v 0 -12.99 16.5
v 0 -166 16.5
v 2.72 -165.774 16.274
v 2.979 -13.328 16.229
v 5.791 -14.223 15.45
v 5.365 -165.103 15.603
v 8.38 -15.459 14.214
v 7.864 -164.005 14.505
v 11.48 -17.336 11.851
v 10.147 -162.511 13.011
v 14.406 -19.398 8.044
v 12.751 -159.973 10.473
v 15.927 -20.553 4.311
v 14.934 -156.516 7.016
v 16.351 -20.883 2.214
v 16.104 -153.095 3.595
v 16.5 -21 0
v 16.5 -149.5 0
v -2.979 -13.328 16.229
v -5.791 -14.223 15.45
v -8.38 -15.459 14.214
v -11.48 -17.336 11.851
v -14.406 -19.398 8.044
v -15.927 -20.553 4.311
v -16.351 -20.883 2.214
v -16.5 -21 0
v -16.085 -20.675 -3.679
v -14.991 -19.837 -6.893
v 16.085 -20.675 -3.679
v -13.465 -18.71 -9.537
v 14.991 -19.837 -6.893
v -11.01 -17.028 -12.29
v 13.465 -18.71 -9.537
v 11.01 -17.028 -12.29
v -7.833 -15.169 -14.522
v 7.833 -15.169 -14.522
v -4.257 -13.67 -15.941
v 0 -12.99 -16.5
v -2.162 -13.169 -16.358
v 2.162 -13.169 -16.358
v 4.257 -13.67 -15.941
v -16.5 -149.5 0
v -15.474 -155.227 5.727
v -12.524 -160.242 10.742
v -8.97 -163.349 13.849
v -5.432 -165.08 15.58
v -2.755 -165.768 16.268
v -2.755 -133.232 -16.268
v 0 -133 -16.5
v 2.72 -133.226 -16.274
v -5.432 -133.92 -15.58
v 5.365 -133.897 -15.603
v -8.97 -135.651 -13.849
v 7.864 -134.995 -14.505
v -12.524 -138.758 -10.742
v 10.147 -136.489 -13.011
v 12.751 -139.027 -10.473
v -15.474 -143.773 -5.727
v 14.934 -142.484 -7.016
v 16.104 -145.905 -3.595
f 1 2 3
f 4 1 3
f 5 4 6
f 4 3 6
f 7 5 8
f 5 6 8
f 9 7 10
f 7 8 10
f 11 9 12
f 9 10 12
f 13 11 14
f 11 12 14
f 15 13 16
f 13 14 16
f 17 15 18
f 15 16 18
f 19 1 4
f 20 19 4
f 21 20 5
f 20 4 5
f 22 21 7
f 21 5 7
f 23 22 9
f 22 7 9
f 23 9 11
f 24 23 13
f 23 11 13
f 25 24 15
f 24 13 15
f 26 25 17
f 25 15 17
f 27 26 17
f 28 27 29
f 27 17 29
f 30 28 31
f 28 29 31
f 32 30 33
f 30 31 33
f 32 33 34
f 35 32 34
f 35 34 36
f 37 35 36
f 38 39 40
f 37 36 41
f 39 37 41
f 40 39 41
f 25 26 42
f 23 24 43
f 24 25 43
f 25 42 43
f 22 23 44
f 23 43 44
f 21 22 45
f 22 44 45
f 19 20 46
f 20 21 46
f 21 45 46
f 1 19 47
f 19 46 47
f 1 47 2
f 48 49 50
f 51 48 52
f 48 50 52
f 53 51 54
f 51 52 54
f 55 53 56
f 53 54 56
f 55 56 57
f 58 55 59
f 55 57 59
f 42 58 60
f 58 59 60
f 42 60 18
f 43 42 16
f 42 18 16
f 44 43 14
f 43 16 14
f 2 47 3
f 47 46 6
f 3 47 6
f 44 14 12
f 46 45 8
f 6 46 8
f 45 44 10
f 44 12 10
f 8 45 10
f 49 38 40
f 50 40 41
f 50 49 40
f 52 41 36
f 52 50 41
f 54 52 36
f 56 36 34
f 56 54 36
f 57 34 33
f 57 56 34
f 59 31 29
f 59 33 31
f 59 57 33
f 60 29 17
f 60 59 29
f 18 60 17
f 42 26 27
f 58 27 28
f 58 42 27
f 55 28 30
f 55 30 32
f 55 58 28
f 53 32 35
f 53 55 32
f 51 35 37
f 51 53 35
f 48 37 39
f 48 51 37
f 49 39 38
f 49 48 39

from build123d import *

# Parameters (mm, degrees)
F0_W     = 33
F0_H     = 33
F1_DEPTH = 166
F3_DEPTH = 100
F4_R     = 16.49999
F6_DEPTH = 50


# Not quite as in the source:
# - a fillet or chamfer is up to 0.001 mm smaller than in the source, because OpenCascade refuses the exact size


with BuildPart() as f1:
    # F0 (on Front) → F1 (new body)
    with BuildSketch(Plane.XZ):
        Rectangle(F0_W, F0_H)
    extrude(amount=F1_DEPTH)

    # F2 (on face) → F3 (cut)
    with BuildSketch(Plane.YZ.offset(16.5)):
        Polygon((-133, -16.5), (-166, 16.5), (-166, -16.5), align=None)
    extrude(amount=-F3_DEPTH, mode=Mode.SUBTRACT)

    # F4 (radius 16.5 in the source; OpenCascade refuses exactly that, so slightly less here)
    f4_edges = [f1.edges().sort_by_distance(p)[0] for p in [
        (-16.5, -83, 16.5),
        (-16.5, -66.5, -16.5),
        (16.5, -83, 16.5),
        (16.5, -66.5, -16.5),
    ]]
    fillet(f4_edges, radius=F4_R)

    # F5 (on Right) → F6 (cut, symmetric)
    with BuildSketch(Plane.YZ):
        with BuildLine():
            Line((0, -21), (0, 0))
            Line((0, 0), (0, 21))
            ThreePointArc((0, 21), (-21, 0), (0, -21))
        make_face()
    extrude(amount=F6_DEPTH, both=True, mode=Mode.SUBTRACT)


solid = f1.part
